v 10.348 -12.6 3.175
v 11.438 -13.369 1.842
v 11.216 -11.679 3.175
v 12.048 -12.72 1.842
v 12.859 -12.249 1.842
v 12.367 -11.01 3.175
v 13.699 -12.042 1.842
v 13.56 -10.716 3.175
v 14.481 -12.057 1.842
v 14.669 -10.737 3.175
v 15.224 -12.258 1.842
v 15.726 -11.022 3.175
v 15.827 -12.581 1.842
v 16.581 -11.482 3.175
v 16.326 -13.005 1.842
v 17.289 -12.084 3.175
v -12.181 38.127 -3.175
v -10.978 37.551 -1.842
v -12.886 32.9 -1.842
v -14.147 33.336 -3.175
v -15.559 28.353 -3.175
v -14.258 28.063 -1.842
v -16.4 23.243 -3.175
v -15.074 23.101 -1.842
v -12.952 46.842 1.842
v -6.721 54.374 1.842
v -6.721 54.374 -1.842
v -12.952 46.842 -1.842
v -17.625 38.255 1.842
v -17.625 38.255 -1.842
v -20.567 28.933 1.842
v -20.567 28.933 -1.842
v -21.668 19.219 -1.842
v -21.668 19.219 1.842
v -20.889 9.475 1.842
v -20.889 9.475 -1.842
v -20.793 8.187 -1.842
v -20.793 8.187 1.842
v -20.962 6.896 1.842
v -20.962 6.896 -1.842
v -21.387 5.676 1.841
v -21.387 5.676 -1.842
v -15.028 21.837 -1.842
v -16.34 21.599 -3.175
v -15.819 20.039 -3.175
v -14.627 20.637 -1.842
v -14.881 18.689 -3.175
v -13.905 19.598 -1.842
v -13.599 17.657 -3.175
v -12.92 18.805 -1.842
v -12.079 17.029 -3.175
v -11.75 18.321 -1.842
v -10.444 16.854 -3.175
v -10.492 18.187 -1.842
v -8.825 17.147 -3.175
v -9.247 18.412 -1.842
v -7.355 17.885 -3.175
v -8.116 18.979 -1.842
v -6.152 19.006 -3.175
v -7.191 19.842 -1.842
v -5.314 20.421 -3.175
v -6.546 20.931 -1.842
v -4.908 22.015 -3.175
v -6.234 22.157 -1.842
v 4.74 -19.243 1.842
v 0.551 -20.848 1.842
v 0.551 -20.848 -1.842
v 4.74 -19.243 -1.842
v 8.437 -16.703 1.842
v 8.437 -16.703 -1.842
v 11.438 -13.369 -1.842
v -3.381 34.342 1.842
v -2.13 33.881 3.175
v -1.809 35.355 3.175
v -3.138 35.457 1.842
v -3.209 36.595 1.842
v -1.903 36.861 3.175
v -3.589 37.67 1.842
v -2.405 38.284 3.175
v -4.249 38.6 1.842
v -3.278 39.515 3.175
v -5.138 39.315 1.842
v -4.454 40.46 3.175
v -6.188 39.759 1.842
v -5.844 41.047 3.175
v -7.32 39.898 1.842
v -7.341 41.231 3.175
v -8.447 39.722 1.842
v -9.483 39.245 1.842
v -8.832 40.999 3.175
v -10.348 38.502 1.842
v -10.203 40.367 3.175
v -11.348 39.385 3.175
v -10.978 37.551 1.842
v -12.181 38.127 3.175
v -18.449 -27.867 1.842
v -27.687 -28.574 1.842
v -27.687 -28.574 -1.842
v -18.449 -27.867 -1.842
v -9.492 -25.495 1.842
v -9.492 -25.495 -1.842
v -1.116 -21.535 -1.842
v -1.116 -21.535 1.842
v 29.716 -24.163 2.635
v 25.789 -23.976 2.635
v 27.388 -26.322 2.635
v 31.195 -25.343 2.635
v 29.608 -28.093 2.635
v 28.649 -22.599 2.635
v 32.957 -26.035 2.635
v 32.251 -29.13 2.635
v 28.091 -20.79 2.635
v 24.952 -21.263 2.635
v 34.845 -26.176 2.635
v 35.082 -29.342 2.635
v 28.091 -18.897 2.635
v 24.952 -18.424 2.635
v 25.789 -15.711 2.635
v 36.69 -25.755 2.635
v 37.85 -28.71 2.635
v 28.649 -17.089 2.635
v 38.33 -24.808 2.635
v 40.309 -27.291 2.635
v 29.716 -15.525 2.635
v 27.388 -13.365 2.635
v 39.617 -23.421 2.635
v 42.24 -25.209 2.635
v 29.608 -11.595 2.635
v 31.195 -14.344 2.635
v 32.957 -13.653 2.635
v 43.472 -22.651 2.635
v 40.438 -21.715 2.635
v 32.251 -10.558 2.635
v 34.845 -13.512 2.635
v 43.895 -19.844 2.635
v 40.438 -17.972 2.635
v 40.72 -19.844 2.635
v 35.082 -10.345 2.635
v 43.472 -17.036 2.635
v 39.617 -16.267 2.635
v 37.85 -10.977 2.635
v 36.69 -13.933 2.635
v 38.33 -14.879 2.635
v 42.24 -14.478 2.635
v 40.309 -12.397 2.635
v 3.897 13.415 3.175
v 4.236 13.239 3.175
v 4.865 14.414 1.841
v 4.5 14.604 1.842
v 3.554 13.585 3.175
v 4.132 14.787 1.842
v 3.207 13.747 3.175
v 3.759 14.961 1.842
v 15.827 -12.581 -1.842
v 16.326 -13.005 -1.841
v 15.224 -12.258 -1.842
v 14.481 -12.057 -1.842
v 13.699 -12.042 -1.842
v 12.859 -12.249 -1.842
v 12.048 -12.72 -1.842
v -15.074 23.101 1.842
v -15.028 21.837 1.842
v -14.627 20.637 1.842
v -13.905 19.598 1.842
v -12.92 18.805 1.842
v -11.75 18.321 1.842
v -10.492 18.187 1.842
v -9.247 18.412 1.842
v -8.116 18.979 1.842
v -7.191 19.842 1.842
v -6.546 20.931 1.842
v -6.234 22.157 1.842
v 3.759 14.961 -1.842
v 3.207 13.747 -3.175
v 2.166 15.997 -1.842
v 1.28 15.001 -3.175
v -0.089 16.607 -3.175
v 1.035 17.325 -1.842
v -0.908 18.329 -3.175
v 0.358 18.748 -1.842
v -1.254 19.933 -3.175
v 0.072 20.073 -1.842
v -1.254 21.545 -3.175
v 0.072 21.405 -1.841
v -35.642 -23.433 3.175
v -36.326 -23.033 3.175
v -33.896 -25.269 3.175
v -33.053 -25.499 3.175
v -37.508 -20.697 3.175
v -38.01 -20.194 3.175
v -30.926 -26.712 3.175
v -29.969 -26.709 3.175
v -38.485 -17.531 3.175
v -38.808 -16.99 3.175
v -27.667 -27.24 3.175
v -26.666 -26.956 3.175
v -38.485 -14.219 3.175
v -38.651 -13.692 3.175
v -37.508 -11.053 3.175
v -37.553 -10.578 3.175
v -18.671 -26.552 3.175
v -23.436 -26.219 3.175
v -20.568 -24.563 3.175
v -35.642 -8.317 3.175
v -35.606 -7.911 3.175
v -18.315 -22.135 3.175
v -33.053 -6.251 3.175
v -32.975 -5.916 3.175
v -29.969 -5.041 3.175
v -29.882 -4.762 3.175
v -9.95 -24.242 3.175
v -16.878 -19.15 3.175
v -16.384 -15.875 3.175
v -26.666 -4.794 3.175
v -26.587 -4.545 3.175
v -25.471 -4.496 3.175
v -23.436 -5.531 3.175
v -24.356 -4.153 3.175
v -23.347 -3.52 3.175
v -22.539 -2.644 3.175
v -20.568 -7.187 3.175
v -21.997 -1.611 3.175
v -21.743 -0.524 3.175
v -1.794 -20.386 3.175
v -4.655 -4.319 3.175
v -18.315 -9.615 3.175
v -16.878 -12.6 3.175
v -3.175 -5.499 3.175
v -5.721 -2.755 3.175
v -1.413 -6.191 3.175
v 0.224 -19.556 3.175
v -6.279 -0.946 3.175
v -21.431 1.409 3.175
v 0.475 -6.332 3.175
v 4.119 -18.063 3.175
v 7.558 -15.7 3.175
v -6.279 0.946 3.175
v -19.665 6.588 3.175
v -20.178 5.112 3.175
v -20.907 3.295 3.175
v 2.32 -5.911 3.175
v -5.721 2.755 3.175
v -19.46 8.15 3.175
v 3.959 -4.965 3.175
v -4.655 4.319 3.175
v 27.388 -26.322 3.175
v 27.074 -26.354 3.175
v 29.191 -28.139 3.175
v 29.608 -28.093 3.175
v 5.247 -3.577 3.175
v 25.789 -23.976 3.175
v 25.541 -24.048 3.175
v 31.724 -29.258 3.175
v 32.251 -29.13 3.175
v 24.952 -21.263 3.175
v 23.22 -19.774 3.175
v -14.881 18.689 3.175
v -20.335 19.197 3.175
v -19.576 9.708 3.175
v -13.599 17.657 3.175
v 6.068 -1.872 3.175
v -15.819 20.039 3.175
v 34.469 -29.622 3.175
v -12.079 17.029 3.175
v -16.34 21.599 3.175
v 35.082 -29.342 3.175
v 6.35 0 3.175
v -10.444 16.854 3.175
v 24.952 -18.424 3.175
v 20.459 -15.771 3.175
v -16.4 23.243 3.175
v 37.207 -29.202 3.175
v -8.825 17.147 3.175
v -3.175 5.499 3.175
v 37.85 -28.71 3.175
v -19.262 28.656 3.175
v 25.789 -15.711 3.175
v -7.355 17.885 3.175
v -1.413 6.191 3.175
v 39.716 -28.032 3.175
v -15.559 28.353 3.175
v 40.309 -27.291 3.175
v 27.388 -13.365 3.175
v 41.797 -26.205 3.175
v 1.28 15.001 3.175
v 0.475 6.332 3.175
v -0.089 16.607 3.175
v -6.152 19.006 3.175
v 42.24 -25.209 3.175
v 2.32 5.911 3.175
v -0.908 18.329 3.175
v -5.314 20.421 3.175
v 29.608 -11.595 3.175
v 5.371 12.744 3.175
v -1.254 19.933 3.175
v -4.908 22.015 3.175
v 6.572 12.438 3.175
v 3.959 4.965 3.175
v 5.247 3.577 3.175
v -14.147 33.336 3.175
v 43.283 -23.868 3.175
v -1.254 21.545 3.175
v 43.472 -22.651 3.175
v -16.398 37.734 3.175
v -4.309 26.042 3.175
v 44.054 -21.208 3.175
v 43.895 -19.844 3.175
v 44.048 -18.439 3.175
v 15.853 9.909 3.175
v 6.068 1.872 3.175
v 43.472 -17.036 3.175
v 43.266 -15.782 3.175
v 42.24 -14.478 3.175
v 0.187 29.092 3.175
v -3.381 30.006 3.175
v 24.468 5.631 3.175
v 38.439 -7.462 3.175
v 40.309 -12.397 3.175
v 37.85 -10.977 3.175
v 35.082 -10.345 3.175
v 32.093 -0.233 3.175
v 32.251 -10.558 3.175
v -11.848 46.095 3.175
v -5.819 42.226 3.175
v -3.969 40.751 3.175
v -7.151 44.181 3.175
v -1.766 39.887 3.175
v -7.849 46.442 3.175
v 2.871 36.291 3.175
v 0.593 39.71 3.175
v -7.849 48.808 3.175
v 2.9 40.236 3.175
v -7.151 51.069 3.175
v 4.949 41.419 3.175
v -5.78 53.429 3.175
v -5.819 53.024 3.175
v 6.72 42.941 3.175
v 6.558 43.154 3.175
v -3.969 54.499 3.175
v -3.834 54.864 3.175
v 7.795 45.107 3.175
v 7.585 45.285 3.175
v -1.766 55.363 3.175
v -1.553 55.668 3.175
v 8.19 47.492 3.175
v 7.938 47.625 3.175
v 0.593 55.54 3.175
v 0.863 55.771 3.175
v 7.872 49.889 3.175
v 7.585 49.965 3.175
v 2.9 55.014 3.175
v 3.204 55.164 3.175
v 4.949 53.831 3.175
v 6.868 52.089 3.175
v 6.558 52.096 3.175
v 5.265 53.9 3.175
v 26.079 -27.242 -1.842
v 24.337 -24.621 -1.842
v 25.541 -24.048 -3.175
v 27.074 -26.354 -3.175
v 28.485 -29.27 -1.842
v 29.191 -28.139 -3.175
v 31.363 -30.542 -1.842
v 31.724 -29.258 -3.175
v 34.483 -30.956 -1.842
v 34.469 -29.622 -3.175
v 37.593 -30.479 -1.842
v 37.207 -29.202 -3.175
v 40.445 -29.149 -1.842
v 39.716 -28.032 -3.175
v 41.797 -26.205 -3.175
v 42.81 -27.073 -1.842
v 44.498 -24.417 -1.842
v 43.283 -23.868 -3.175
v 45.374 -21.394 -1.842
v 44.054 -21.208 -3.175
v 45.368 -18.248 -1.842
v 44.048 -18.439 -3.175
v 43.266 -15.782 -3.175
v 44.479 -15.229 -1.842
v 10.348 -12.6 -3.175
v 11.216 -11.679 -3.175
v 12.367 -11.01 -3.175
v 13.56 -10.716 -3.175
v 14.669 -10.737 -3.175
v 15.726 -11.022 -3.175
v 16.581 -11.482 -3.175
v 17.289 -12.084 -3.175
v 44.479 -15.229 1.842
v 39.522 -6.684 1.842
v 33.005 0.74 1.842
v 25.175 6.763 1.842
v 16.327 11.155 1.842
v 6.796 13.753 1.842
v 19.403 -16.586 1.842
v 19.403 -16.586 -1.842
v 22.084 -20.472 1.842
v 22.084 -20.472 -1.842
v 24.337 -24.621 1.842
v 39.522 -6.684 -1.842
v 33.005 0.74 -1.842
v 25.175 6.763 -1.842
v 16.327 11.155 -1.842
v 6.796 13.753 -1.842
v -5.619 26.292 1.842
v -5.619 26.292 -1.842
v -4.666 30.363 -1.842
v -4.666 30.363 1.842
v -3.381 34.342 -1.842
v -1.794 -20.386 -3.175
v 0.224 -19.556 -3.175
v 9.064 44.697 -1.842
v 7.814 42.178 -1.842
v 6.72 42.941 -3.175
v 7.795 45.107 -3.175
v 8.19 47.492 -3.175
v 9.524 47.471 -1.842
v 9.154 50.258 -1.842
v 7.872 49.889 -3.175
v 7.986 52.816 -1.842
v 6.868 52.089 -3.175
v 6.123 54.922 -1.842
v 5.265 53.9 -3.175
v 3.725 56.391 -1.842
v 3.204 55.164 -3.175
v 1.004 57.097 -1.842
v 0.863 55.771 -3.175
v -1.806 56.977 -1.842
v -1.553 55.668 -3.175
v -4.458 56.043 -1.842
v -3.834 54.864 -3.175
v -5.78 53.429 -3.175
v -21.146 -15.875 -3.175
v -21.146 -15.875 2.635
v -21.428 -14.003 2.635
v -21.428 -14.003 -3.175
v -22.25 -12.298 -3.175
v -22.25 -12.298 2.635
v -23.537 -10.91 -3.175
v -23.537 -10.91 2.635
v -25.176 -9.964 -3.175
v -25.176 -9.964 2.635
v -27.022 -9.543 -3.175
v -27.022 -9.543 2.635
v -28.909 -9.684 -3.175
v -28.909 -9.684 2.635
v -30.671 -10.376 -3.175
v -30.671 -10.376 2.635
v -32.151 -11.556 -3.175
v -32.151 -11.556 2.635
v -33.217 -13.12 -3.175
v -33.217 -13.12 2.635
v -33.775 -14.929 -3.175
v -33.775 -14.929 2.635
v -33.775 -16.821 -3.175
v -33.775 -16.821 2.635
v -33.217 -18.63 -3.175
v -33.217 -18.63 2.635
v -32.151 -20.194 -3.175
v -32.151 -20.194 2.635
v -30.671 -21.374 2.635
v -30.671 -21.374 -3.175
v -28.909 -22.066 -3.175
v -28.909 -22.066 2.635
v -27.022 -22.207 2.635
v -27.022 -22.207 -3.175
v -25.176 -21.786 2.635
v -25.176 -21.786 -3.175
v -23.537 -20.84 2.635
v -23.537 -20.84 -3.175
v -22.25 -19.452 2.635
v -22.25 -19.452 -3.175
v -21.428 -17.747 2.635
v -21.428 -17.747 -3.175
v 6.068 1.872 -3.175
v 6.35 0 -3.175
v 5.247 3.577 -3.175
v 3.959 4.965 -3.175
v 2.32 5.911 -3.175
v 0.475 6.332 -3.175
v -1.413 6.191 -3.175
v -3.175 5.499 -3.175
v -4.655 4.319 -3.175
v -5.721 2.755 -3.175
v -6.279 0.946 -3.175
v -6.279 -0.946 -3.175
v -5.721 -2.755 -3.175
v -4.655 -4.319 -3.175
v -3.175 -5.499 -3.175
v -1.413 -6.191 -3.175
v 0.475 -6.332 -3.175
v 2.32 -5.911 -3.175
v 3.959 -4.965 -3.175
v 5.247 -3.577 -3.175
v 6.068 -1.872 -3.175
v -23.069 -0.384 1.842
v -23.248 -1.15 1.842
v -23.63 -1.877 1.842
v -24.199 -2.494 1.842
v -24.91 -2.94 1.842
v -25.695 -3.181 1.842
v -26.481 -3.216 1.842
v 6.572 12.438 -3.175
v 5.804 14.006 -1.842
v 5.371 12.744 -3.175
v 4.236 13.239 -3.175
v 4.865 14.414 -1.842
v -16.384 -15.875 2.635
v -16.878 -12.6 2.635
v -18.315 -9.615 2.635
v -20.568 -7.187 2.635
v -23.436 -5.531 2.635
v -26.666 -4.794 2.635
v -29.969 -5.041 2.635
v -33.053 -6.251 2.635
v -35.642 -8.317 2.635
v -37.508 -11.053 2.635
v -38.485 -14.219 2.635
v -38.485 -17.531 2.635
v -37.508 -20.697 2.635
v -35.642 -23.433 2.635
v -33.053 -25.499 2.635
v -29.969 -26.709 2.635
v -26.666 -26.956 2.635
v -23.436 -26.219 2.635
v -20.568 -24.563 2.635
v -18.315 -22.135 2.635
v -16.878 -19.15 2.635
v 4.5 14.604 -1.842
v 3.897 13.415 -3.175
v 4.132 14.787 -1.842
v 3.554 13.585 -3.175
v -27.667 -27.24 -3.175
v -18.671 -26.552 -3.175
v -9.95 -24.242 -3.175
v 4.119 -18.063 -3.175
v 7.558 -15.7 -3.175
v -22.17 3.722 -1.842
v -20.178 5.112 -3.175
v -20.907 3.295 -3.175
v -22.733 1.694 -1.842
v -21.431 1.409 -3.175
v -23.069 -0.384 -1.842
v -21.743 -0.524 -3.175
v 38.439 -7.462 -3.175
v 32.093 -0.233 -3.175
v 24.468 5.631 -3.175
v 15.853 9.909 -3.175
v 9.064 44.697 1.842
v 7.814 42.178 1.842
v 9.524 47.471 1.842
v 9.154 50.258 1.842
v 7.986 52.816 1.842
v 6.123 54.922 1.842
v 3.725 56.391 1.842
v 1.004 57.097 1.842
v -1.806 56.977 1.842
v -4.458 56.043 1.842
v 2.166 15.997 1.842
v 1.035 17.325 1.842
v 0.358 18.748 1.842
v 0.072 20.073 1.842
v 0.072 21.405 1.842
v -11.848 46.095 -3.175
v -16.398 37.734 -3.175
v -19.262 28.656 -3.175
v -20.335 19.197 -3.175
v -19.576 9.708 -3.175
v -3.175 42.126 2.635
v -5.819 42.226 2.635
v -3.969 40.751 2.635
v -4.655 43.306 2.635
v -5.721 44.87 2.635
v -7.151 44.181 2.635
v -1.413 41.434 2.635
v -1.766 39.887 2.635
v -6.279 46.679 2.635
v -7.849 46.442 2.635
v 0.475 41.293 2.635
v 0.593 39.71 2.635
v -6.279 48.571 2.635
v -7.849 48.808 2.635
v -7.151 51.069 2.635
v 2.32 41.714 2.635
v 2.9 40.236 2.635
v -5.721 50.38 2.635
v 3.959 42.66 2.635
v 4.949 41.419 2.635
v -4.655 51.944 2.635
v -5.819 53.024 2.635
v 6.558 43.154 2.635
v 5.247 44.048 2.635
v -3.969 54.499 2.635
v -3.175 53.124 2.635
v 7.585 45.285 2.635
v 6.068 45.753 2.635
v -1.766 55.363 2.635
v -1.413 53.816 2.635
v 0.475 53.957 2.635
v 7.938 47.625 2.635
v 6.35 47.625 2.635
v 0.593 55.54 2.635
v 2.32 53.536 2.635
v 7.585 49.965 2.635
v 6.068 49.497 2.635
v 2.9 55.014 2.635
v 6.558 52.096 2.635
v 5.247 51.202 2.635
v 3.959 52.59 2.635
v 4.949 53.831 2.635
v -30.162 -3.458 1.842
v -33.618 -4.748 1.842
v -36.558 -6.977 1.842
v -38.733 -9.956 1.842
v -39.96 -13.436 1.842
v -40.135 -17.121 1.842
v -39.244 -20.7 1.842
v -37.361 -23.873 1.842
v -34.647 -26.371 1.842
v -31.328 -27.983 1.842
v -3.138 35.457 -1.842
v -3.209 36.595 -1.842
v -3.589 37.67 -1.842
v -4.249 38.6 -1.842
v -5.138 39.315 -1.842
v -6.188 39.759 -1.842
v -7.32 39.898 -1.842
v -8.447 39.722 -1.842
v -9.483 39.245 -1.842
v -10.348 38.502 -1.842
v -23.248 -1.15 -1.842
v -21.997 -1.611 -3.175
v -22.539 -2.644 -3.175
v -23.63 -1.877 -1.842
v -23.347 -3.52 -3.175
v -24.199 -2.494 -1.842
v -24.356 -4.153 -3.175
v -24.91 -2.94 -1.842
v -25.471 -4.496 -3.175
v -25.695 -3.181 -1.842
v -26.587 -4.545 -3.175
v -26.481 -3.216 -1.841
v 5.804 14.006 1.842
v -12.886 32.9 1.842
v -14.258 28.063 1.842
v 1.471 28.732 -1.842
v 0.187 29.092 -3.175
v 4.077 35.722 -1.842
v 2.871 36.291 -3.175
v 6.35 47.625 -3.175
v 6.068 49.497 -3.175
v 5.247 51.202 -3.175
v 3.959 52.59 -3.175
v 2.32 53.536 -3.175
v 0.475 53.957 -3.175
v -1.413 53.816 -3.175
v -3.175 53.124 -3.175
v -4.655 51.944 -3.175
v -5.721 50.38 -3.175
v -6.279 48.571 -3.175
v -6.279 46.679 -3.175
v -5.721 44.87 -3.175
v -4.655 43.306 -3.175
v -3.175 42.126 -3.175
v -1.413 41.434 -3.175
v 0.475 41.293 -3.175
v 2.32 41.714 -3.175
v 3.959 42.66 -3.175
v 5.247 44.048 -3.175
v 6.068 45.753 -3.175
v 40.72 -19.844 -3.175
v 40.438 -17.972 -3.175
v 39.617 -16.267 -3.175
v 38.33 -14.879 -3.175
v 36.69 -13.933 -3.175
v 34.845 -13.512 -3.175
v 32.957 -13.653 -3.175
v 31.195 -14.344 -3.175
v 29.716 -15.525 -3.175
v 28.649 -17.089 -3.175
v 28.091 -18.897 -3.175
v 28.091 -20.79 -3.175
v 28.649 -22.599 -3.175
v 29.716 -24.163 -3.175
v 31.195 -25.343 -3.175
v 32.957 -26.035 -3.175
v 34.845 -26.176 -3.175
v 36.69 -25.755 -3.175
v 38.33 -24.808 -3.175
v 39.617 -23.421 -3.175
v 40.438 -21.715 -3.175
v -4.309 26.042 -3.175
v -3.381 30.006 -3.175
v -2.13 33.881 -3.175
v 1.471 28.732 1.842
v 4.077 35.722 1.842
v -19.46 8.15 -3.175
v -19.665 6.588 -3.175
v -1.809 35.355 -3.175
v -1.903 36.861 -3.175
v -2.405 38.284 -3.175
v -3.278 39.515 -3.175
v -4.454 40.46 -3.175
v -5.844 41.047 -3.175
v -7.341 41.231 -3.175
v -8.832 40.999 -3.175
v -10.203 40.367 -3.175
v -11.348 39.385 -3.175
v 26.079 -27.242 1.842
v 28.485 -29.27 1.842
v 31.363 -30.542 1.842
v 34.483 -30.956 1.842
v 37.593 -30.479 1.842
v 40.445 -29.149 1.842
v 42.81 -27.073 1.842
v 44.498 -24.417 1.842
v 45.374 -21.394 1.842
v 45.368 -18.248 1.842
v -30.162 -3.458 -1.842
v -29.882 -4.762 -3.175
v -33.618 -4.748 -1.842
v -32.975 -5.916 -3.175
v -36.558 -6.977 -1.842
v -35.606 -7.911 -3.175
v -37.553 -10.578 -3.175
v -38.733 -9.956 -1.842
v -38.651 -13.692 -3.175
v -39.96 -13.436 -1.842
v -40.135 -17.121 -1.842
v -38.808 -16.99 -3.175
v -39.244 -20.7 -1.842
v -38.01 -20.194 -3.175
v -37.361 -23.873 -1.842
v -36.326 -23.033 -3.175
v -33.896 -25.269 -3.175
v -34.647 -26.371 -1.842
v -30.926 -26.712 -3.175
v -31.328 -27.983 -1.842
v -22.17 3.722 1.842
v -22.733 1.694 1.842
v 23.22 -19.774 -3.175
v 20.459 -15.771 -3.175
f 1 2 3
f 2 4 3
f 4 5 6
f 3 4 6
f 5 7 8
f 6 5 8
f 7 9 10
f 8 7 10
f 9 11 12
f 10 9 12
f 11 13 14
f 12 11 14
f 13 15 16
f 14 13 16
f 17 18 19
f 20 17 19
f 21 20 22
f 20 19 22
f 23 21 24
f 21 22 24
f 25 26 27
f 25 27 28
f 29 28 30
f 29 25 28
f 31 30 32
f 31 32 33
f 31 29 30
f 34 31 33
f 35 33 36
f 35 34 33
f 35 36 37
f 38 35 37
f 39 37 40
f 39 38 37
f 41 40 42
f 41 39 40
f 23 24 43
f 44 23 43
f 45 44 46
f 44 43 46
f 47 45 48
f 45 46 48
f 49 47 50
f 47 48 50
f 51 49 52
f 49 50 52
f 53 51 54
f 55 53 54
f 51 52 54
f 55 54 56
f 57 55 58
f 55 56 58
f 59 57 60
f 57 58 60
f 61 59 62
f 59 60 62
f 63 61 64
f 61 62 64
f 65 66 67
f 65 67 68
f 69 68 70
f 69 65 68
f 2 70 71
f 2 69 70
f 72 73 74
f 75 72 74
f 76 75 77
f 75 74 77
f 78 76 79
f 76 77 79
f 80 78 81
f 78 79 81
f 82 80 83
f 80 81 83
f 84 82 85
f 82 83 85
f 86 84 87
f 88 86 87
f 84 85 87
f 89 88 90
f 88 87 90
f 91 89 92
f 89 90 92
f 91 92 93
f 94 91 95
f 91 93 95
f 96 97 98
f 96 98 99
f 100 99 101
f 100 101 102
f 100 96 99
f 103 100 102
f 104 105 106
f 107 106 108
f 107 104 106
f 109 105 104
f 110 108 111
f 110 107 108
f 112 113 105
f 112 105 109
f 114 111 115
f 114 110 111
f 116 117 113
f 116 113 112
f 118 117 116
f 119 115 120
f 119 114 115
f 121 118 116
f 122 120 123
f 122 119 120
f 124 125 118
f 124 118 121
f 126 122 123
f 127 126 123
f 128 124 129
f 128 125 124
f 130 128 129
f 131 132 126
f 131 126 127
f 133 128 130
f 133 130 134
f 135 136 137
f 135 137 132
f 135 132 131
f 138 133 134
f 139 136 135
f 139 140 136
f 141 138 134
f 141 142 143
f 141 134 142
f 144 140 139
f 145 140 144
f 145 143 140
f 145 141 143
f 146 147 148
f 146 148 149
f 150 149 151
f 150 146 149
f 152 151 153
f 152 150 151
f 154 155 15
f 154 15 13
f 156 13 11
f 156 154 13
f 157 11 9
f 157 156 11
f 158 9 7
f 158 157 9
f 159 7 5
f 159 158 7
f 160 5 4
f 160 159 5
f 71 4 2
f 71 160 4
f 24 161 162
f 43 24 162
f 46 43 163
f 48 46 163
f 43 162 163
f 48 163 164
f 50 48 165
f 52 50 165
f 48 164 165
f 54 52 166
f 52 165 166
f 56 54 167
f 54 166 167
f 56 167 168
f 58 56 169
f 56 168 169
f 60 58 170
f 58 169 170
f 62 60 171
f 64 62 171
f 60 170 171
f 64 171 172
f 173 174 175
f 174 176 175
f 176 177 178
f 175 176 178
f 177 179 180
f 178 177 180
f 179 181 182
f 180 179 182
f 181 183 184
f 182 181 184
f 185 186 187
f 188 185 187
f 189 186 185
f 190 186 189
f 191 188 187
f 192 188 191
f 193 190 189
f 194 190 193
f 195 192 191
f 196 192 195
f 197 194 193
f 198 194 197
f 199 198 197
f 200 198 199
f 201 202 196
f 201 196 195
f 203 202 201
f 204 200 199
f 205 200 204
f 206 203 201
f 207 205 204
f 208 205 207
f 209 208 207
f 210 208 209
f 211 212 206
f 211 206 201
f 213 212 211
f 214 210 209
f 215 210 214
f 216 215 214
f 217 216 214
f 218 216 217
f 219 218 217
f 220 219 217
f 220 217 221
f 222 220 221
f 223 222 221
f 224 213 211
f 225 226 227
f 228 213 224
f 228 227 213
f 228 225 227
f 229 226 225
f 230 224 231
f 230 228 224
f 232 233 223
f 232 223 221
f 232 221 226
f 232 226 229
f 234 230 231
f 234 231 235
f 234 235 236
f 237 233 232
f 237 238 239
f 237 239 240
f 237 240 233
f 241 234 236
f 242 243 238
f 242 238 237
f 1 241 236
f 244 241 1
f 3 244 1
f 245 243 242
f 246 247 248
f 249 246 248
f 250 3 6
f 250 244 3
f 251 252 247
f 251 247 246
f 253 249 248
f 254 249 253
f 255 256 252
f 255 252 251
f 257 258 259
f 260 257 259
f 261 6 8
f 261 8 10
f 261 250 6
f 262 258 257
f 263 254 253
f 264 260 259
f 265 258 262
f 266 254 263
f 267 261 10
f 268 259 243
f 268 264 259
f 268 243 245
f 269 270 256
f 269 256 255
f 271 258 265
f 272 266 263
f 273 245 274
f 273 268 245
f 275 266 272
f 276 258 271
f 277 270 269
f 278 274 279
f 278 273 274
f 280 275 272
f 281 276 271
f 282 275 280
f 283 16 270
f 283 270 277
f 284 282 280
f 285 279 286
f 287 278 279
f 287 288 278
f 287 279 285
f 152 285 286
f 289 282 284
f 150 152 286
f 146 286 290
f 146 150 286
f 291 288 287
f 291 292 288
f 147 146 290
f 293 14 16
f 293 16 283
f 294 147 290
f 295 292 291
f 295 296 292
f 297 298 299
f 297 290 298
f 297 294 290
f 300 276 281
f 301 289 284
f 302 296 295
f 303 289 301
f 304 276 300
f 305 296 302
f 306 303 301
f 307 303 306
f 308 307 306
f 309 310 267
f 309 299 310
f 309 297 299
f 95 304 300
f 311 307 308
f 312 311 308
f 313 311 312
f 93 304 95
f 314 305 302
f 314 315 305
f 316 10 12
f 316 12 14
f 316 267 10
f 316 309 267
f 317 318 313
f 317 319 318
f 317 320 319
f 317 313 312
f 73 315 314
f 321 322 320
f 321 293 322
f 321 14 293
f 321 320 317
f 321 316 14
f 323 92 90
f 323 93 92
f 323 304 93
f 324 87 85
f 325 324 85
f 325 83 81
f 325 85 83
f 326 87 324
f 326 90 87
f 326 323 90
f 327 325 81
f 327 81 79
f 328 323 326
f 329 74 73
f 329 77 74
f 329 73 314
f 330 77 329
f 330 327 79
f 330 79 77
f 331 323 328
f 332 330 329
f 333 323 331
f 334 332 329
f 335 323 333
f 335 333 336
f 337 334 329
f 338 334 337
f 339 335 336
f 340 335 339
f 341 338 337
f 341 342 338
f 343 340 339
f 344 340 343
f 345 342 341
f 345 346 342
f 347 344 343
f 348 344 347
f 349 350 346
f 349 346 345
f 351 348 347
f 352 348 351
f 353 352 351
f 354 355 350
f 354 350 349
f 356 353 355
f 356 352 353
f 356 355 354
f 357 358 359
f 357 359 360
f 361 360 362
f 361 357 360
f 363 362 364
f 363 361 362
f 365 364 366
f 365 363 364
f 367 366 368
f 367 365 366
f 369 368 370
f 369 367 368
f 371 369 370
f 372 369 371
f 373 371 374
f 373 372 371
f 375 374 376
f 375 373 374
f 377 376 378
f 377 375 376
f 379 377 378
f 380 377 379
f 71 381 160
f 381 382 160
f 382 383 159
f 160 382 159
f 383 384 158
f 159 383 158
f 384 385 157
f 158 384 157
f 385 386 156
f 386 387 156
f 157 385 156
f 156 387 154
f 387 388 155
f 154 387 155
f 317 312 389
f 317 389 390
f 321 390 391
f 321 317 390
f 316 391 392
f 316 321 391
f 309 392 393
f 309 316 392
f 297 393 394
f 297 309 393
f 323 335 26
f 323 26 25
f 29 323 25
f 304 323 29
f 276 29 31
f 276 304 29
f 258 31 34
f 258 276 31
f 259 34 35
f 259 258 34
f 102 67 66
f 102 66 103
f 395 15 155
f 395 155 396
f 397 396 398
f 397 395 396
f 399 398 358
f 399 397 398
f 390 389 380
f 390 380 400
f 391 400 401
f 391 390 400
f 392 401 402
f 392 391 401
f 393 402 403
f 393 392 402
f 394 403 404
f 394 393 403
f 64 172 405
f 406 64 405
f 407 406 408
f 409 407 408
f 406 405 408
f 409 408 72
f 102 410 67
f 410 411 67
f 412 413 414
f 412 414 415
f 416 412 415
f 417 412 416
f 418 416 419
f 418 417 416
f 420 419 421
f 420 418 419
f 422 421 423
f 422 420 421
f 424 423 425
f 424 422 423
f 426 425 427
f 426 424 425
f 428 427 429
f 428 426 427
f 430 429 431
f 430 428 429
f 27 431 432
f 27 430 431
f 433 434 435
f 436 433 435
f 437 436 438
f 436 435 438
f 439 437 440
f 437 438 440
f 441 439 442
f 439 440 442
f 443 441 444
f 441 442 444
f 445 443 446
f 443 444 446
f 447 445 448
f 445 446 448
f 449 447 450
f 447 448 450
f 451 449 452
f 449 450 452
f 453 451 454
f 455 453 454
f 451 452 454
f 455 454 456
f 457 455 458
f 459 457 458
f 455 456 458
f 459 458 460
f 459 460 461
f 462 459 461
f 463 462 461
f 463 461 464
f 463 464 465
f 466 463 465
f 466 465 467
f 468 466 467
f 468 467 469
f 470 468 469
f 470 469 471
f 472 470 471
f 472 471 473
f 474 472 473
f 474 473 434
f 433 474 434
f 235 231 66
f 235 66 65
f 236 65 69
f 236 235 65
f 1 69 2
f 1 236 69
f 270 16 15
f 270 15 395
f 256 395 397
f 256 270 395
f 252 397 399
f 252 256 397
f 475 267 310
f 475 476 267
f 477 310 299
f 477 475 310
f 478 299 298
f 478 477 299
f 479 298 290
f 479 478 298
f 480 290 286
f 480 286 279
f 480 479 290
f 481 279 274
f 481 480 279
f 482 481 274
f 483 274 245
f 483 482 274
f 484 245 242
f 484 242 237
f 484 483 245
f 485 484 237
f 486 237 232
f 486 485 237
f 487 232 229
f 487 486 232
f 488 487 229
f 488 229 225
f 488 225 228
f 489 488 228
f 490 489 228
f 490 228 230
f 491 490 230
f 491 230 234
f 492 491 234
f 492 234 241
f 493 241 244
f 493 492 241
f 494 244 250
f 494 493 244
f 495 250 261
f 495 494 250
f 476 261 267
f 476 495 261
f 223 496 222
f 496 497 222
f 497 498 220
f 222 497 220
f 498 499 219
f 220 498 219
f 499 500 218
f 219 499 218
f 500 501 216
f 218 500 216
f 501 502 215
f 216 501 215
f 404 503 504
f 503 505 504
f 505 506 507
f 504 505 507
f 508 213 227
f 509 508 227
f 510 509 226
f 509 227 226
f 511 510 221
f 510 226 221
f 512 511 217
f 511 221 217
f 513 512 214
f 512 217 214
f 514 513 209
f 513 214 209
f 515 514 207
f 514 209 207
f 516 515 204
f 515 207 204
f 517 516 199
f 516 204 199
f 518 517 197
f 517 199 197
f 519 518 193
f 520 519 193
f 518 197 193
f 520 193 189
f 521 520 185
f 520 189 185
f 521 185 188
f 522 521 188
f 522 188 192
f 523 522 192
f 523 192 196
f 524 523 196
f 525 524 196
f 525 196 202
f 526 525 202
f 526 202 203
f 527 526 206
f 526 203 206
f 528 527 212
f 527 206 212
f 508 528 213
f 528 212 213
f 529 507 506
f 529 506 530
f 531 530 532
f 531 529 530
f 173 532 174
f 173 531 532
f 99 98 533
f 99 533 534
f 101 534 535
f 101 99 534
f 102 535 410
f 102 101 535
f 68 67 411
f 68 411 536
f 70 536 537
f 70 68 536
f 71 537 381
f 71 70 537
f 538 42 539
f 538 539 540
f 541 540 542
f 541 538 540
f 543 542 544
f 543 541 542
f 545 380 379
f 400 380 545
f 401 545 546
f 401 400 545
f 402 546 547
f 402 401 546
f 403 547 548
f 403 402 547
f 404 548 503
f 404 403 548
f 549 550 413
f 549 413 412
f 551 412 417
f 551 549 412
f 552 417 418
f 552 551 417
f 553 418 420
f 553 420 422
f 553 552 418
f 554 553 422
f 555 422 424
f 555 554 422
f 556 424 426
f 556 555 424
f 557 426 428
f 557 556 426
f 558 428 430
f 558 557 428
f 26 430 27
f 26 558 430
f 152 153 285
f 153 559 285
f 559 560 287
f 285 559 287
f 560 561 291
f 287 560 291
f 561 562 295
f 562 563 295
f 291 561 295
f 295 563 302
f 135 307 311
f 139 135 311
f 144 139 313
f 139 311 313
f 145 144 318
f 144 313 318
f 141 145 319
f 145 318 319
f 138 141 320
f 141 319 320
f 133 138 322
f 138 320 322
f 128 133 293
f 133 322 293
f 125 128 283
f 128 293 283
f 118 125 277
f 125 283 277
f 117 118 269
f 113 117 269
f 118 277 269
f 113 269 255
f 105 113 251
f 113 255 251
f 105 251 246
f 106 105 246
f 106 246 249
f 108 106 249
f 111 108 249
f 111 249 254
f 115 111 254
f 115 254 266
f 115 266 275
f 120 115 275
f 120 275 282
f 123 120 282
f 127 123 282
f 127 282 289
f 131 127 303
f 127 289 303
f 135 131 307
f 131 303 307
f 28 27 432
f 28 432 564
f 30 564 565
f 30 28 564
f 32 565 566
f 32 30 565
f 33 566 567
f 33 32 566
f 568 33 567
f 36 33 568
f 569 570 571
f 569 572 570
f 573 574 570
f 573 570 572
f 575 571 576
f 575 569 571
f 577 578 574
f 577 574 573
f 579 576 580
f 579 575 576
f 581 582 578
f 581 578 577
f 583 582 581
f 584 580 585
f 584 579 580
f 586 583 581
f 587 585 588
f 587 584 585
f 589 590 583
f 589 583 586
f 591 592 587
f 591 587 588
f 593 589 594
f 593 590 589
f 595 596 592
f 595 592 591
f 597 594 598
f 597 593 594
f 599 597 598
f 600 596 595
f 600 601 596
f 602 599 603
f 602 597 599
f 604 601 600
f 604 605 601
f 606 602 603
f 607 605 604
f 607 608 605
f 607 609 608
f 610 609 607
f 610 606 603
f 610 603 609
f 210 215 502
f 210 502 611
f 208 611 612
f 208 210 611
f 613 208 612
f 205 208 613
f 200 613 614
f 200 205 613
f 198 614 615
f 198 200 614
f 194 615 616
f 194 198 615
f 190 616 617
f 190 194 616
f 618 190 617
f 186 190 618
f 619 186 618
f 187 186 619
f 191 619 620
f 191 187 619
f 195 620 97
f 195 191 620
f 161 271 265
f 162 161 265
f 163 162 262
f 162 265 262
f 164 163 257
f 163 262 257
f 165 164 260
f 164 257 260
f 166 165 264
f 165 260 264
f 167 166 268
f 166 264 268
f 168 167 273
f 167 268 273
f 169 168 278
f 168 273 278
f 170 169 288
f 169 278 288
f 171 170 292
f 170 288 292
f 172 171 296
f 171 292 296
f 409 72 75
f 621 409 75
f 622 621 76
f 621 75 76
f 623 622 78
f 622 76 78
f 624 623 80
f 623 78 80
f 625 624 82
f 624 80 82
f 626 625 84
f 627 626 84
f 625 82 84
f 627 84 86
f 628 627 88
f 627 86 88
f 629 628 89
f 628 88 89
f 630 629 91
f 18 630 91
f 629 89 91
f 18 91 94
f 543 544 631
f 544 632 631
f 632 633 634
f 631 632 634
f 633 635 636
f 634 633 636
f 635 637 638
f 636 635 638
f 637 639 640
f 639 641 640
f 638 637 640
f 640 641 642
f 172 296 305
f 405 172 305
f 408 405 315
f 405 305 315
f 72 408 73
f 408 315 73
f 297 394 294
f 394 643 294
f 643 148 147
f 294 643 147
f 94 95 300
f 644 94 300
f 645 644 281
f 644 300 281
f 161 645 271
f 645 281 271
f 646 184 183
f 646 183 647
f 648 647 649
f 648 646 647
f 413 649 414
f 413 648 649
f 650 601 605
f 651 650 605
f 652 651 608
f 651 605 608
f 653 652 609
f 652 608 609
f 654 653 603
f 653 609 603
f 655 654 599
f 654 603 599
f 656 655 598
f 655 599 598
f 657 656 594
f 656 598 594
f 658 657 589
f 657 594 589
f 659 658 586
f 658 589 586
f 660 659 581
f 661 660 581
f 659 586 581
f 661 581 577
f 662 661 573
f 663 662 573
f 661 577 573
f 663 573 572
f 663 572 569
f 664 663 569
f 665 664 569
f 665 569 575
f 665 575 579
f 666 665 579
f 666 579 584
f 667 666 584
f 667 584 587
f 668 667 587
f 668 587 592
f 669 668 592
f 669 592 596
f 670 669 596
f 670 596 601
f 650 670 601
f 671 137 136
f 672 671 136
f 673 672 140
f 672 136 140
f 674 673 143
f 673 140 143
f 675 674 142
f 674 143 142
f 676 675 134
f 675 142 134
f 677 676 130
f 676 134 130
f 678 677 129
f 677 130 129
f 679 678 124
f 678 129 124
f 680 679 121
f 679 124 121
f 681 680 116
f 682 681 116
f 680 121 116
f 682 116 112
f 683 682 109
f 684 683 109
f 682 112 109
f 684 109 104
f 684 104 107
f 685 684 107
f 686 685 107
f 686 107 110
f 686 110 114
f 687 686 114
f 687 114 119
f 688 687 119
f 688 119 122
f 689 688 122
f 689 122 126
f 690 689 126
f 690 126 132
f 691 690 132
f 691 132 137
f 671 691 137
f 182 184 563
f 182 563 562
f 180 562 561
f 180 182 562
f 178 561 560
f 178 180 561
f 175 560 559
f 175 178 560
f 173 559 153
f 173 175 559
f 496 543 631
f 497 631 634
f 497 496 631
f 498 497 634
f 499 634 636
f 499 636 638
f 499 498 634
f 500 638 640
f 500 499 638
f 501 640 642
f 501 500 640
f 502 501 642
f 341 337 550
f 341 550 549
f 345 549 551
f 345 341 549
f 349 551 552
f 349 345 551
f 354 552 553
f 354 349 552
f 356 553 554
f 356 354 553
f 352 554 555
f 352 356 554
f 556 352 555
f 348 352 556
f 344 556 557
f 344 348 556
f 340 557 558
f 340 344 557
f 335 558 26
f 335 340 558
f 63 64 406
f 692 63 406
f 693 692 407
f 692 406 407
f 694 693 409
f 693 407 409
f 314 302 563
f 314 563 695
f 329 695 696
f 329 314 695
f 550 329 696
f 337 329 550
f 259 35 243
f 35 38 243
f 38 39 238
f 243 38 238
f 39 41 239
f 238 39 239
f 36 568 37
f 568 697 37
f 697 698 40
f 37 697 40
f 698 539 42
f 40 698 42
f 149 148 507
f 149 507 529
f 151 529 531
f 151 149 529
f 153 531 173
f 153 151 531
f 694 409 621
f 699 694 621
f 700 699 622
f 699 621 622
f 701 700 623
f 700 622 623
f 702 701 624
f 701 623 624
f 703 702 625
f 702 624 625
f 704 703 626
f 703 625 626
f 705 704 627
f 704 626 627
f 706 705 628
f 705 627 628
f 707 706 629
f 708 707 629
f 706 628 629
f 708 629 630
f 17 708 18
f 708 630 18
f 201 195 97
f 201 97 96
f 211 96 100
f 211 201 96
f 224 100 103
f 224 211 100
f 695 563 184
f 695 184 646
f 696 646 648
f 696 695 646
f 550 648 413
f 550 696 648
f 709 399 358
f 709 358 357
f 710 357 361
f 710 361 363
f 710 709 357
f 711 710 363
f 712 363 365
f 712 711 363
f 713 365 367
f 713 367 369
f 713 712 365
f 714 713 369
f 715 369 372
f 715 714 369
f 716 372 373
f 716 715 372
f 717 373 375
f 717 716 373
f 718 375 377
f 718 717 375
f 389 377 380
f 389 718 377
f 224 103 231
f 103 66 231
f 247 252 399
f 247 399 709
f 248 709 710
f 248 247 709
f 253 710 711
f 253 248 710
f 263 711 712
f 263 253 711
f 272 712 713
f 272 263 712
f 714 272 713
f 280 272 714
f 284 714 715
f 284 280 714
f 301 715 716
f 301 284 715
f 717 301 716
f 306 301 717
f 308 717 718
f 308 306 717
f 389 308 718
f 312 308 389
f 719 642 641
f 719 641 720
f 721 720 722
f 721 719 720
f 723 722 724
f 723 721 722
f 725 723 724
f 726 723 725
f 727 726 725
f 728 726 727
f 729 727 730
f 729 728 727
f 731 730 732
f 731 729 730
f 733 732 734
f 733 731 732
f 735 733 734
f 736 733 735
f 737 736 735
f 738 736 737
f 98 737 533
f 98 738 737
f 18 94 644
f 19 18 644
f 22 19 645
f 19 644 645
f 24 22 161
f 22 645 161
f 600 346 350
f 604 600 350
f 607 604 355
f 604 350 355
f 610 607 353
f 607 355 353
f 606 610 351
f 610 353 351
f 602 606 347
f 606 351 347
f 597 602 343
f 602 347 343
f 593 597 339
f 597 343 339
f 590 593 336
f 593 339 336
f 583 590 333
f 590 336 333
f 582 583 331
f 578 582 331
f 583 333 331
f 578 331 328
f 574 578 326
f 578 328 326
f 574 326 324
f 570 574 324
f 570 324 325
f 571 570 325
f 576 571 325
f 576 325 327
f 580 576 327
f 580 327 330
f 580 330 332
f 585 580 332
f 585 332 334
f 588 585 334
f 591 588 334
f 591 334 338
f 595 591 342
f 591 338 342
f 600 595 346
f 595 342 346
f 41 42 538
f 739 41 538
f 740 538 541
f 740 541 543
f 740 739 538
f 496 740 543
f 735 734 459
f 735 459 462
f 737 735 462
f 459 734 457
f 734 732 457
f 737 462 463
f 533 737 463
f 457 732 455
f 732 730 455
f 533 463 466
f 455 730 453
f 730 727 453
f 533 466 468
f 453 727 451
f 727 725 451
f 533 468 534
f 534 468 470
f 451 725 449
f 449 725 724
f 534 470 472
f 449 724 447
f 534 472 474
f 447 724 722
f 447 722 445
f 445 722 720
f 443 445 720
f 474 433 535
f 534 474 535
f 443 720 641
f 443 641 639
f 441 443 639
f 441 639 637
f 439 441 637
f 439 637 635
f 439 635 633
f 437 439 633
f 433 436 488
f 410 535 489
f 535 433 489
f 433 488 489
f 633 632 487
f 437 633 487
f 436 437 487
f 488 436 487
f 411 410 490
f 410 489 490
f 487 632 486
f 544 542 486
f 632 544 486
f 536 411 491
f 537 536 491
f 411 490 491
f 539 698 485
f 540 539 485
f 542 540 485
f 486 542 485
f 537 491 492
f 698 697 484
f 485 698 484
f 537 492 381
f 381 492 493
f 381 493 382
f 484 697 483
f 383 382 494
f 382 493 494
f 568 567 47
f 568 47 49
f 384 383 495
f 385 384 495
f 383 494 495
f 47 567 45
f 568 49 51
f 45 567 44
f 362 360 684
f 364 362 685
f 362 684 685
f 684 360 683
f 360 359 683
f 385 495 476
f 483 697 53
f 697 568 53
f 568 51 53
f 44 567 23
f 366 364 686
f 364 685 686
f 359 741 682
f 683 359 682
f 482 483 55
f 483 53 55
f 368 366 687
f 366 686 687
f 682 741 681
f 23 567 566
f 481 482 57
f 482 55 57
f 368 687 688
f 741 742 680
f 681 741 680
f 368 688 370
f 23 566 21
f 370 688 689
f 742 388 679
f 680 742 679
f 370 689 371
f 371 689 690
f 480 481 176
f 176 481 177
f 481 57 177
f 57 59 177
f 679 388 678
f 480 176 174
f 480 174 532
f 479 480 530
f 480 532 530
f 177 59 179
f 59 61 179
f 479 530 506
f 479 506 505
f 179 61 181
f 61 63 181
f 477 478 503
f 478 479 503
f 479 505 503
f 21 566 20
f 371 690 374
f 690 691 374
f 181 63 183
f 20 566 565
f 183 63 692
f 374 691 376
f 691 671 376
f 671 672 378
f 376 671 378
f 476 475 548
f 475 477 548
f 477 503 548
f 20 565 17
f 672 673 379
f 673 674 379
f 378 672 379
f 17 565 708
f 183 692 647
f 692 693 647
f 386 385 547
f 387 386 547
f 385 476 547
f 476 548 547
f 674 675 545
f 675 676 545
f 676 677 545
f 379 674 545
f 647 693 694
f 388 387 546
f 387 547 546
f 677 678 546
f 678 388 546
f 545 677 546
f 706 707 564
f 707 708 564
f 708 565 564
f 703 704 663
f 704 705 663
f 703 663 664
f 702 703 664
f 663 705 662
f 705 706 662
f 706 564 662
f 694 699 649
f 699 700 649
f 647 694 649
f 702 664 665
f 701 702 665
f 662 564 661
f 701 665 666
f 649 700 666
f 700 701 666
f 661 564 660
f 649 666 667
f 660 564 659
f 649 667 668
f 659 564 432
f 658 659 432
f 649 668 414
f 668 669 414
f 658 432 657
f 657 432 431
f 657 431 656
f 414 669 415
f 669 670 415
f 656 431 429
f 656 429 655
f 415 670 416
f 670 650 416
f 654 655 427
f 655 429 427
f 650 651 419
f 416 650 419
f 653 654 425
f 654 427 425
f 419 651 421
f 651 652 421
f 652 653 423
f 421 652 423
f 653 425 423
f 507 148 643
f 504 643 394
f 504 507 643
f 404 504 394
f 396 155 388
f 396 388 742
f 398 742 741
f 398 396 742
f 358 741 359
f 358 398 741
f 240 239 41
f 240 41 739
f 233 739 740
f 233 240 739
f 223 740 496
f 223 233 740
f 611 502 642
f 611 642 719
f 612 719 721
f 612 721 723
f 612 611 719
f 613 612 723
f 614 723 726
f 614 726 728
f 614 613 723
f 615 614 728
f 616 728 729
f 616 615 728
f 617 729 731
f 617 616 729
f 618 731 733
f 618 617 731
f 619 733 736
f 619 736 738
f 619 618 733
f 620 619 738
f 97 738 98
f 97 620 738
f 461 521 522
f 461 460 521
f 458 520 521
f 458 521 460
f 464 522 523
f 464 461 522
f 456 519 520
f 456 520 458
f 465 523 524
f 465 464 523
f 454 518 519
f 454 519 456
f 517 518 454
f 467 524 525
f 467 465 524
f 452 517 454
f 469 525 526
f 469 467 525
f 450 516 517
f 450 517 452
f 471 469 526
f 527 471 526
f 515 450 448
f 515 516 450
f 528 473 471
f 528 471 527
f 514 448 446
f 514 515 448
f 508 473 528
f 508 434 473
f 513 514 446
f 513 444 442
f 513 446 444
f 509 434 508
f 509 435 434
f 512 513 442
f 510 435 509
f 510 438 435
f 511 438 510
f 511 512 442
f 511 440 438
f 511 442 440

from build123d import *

# Parameters (mm, degrees)
F1_R      = 6.35
F2_DEPTH  = 3.175
F3_R      = 6.35
F4_DEPTH  = 6.351
F5_R      = 6.35
F6_R      = 3.175
F7_R      = 11.1125
F7_R_2    = 9.525
F7_R_3    = 7.9375
F8_DEPTH  = 0.53975
F11_DEPTH = 25.4
F12_SIZE  = 1.3335


with BuildPart() as f2:
    # F1 (on Top) → F2 (new body, symmetric)
    with BuildSketch(Plane.XY):
        with BuildLine():
            ThreePointArc((-0.168710733, 16.2535201518), (1.7967030303, 29.8395650927), (7.8138383534, 42.1780232985))
            ThreePointArc((7.8138383534, 42.1780232985), (6.1225519823, 54.9215733207), (-6.7210836767, 54.3742710132))
            ThreePointArc((-6.7210836767, 54.3742710132), (-19.6290735416, 32.6508588295), (-20.4740110981, 7.3959797012))
            ThreePointArc((-20.4740110981, 7.3959797012), (-22.6457174108, 2.0757674769), (-23.1321493543, -3.6499945148))
            ThreePointArc((-23.1321493543, -3.6499945148), (-24.3075600188, -3.5087608054), (-25.4787925595, -3.3362744979))
            ThreePointArc((-25.4787925595, -3.3362744979), (-40.1479792359, -14.7681220671), (-27.6867699643, -28.5735717187))
            ThreePointArc((-27.6867699643, -28.5735717187), (-13.4568579615, -26.7614387597), (-0.300857561, -21.0435829613))
            ThreePointArc((-0.300857561, -21.0435829613), (7.8163915703, -17.2243931464), (13.2856838039, -10.1136416555))
            ThreePointArc((13.2856838039, -10.1136416555), (19.5634681844, -16.7944756929), (24.337196584, -24.6210737617))
            ThreePointArc((24.337196584, -24.6210737617), (39.0667286463, -29.9150952834), (44.4792335839, -15.2286876578))
            ThreePointArc((44.4792335839, -15.2286876578), (28.8065675228, 4.269400985), (5.72810807, 13.9230340561))
            ThreePointArc((5.72810807, 13.9230340561), (2.8773398413, 15.3353381376), (-0.168710733, 16.2535201518))
        make_face()
        Circle(F1_R, mode=Mode.SUBTRACT)
    extrude(amount=F2_DEPTH, both=True)

    # F3 (on face) → F4 (cut, through all)
    with BuildSketch(Plane.XY.offset(3.175)):
        with Locations((0, 47.625)):
            Circle(F3_R)
        with Locations((34.3703832127, -19.84375)):
            Circle(F3_R)
        with Locations((-27.4963065702, -15.875)):
            Circle(F3_R)
    extrude(amount=-F4_DEPTH, mode=Mode.SUBTRACT)

    # F5
    f5_edges = [f2.edges().sort_by_distance(p)[0] for p in [
        (-20.474011, 7.39598, 0),
        (-0.168711, 16.25352, 0),
        (5.728108, 13.923034, 0),
        (-0.300858, -21.043583, 0),
    ]]
    fillet(f5_edges, radius=F5_R)

    # F6
    f6_edges = [f2.edges().sort_by_distance(p)[0] for p in [
        (13.285684, -10.113642, 0),
        (-23.132149, -3.649995, 0),
    ]]
    fillet(f6_edges, radius=F6_R)

    # F7 (on face) → F8 (cut)
    with BuildSketch(Plane.XY.offset(3.175)):
        with Locations((-27.4963065702, -15.875)):
            Circle(F7_R)
        with Locations((34.3703832127, -19.84375)):
            Circle(F7_R_2)
        with Locations((0, 47.625)):
            Circle(F7_R_3)
    extrude(amount=-F8_DEPTH, mode=Mode.SUBTRACT)

    # F10 (on face) → F11 (cut)
    with BuildSketch(Plane.XY.offset(3.175)):
        with BuildLine():
            ThreePointArc((-10.9775403861, 37.5513992072), (-13.6403456115, 30.5006059619), (-15.0736581613, 23.1012930078))
            ThreePointArc((-15.0736581613, 23.1012930078), (-11.1261361584, 18.2091441919), (-6.2339873425, 22.1566661948))
            ThreePointArc((-6.2339873425, 22.1566661948), (-5.1843883194, 28.3376957326), (-3.3814010551, 34.3423623497))
            ThreePointArc((-3.3814010551, 34.3423623497), (-5.6475239326, 39.5731654756), (-10.9775403861, 37.5513992072))
        make_face()
    extrude(amount=-F11_DEPTH, mode=Mode.SUBTRACT)

    # F12
    f12_edges = [f2.edges().sort_by_distance(p)[0] for p in [
        (-13.91632, -26.88546, 3.175),
        (-13.91632, -26.88546, -3.175),
        (-13.640346, 30.500606, 3.175),
        (-5.647524, 39.573165, -3.175),
    ]]
    chamfer(f12_edges, length=F12_SIZE)


solid = f2.part
